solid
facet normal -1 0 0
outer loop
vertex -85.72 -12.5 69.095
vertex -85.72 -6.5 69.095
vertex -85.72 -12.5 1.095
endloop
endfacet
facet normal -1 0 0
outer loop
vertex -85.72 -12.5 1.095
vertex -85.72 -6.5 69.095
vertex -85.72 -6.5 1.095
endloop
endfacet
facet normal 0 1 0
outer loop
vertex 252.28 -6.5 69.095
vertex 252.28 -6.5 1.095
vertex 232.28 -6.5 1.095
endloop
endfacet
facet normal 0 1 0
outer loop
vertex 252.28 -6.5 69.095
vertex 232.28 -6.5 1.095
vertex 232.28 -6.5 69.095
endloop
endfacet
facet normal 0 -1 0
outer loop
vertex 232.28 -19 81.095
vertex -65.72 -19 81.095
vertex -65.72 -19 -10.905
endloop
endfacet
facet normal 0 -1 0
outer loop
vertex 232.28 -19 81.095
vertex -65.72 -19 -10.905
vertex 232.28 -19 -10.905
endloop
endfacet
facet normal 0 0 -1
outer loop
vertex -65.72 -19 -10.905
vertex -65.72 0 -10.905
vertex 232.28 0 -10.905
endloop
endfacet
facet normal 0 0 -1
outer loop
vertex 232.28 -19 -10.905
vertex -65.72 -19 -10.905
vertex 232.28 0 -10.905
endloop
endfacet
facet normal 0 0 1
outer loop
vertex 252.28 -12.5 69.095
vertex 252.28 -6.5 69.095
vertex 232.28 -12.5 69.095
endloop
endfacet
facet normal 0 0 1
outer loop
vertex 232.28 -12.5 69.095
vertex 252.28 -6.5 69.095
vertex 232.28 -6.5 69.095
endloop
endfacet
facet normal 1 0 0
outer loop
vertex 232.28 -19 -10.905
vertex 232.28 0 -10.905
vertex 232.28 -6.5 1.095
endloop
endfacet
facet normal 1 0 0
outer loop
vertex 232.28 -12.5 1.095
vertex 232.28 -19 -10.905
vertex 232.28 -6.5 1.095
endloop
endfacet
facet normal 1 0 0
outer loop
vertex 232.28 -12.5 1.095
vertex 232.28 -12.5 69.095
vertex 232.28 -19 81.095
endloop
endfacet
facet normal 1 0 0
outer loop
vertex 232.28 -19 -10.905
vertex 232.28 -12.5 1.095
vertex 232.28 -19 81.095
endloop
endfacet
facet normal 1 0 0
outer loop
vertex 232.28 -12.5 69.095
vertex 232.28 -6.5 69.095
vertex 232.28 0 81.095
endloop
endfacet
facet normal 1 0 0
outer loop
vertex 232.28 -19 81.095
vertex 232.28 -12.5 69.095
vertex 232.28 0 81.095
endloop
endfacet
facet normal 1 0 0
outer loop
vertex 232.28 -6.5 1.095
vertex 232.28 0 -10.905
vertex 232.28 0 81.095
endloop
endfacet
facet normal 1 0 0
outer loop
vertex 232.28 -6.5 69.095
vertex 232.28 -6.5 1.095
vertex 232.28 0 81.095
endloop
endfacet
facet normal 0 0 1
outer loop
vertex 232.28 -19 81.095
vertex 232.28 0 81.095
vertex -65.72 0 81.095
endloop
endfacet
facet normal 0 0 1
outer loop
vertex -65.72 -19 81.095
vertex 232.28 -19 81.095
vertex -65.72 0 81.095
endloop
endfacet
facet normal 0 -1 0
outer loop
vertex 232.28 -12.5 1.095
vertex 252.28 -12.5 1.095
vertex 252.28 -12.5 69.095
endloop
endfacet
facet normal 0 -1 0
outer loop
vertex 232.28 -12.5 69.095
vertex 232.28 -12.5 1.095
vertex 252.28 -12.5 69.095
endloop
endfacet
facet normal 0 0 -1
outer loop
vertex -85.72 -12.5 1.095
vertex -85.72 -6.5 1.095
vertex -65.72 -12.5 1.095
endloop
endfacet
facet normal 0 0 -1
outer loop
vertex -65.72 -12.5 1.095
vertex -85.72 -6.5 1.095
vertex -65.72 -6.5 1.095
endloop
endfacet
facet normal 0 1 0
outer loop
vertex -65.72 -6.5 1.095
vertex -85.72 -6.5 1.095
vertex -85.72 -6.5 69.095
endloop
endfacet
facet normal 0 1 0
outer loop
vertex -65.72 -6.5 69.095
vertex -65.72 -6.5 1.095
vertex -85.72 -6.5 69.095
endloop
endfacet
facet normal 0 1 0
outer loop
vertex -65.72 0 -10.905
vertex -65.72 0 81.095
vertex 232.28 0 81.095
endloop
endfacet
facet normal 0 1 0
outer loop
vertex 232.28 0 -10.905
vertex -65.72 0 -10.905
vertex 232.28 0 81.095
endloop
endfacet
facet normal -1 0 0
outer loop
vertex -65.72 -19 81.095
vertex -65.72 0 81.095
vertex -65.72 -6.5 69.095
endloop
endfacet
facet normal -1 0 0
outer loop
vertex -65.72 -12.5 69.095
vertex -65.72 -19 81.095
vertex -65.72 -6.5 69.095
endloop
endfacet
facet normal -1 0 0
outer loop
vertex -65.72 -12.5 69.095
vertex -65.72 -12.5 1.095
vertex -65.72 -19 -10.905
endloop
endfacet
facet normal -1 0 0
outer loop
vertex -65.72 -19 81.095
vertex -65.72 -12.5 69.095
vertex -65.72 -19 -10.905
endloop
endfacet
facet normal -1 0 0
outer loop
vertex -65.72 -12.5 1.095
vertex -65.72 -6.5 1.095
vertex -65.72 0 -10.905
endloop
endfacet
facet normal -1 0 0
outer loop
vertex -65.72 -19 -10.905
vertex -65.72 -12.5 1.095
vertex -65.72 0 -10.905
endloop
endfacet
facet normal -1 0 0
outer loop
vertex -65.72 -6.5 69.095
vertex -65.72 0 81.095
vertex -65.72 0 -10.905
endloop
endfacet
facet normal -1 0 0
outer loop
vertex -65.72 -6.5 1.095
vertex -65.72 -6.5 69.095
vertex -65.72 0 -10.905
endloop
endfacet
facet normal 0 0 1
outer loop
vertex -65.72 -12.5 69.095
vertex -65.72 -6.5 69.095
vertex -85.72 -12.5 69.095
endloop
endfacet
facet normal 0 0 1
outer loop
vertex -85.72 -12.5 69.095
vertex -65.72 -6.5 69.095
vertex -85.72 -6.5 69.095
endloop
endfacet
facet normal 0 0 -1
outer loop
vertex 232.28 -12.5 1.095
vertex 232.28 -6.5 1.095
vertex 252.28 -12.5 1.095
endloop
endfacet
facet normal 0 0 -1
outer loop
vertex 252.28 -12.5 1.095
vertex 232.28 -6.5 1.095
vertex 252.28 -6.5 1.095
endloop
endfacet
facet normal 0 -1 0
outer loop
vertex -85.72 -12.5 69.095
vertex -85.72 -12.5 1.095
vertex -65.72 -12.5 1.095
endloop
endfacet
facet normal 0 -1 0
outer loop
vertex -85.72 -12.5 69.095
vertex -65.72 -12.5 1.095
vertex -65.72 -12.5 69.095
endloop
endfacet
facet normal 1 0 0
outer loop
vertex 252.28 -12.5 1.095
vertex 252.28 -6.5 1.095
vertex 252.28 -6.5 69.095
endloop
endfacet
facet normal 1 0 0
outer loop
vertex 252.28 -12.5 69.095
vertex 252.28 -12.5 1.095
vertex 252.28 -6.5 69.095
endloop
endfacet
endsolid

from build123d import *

# Parameters (mm, degrees)
F1_DEPTH = 19
F2_W     = 6.5
F2_H     = 68
F3_DEPTH = 20
F4_W     = 6.5
F4_H     = 68
F5_DEPTH = 20


with BuildPart() as f1:
    # F0 (on Front) → F1 (new body)
    with BuildSketch(Plane.XZ):
        Polygon((-65.72042, 69.094742), (-85.72042, 69.094742), (-85.72042, 1.094742), (-65.72042, 1.094742), (-65.72042, -10.905258), (232.27958, -10.905258), (232.27958, 1.094742), (252.27958, 1.094742), (252.27958, 69.094742), (232.27958, 69.094742), (232.27958, 81.094742), (-65.72042, 81.094742), align=None)
    extrude(amount=F1_DEPTH)

    # F2 (on face) → F3 (cut)
    with BuildSketch(Plane.YZ.offset(252.27958)):
        with Locations((-15.75, 35.094742)):
            Rectangle(F2_W, F2_H)
        with Locations((-3.25, 35.094742)):
            Rectangle(F2_W, F2_H)
    extrude(amount=-F3_DEPTH, mode=Mode.SUBTRACT)

    # F4 (on face) → F5 (cut)
    with BuildSketch(Plane(origin=(-85.72042, 0, 0), x_dir=(0, -1, 0), z_dir=(-1, 0, 0))):
        with Locations((3.25, 35.094742)):
            Rectangle(F4_W, F4_H)
        with Locations((15.75, 35.094742)):
            Rectangle(F4_W, F4_H)
    extrude(amount=-F5_DEPTH, mode=Mode.SUBTRACT)


solid = f1.part
